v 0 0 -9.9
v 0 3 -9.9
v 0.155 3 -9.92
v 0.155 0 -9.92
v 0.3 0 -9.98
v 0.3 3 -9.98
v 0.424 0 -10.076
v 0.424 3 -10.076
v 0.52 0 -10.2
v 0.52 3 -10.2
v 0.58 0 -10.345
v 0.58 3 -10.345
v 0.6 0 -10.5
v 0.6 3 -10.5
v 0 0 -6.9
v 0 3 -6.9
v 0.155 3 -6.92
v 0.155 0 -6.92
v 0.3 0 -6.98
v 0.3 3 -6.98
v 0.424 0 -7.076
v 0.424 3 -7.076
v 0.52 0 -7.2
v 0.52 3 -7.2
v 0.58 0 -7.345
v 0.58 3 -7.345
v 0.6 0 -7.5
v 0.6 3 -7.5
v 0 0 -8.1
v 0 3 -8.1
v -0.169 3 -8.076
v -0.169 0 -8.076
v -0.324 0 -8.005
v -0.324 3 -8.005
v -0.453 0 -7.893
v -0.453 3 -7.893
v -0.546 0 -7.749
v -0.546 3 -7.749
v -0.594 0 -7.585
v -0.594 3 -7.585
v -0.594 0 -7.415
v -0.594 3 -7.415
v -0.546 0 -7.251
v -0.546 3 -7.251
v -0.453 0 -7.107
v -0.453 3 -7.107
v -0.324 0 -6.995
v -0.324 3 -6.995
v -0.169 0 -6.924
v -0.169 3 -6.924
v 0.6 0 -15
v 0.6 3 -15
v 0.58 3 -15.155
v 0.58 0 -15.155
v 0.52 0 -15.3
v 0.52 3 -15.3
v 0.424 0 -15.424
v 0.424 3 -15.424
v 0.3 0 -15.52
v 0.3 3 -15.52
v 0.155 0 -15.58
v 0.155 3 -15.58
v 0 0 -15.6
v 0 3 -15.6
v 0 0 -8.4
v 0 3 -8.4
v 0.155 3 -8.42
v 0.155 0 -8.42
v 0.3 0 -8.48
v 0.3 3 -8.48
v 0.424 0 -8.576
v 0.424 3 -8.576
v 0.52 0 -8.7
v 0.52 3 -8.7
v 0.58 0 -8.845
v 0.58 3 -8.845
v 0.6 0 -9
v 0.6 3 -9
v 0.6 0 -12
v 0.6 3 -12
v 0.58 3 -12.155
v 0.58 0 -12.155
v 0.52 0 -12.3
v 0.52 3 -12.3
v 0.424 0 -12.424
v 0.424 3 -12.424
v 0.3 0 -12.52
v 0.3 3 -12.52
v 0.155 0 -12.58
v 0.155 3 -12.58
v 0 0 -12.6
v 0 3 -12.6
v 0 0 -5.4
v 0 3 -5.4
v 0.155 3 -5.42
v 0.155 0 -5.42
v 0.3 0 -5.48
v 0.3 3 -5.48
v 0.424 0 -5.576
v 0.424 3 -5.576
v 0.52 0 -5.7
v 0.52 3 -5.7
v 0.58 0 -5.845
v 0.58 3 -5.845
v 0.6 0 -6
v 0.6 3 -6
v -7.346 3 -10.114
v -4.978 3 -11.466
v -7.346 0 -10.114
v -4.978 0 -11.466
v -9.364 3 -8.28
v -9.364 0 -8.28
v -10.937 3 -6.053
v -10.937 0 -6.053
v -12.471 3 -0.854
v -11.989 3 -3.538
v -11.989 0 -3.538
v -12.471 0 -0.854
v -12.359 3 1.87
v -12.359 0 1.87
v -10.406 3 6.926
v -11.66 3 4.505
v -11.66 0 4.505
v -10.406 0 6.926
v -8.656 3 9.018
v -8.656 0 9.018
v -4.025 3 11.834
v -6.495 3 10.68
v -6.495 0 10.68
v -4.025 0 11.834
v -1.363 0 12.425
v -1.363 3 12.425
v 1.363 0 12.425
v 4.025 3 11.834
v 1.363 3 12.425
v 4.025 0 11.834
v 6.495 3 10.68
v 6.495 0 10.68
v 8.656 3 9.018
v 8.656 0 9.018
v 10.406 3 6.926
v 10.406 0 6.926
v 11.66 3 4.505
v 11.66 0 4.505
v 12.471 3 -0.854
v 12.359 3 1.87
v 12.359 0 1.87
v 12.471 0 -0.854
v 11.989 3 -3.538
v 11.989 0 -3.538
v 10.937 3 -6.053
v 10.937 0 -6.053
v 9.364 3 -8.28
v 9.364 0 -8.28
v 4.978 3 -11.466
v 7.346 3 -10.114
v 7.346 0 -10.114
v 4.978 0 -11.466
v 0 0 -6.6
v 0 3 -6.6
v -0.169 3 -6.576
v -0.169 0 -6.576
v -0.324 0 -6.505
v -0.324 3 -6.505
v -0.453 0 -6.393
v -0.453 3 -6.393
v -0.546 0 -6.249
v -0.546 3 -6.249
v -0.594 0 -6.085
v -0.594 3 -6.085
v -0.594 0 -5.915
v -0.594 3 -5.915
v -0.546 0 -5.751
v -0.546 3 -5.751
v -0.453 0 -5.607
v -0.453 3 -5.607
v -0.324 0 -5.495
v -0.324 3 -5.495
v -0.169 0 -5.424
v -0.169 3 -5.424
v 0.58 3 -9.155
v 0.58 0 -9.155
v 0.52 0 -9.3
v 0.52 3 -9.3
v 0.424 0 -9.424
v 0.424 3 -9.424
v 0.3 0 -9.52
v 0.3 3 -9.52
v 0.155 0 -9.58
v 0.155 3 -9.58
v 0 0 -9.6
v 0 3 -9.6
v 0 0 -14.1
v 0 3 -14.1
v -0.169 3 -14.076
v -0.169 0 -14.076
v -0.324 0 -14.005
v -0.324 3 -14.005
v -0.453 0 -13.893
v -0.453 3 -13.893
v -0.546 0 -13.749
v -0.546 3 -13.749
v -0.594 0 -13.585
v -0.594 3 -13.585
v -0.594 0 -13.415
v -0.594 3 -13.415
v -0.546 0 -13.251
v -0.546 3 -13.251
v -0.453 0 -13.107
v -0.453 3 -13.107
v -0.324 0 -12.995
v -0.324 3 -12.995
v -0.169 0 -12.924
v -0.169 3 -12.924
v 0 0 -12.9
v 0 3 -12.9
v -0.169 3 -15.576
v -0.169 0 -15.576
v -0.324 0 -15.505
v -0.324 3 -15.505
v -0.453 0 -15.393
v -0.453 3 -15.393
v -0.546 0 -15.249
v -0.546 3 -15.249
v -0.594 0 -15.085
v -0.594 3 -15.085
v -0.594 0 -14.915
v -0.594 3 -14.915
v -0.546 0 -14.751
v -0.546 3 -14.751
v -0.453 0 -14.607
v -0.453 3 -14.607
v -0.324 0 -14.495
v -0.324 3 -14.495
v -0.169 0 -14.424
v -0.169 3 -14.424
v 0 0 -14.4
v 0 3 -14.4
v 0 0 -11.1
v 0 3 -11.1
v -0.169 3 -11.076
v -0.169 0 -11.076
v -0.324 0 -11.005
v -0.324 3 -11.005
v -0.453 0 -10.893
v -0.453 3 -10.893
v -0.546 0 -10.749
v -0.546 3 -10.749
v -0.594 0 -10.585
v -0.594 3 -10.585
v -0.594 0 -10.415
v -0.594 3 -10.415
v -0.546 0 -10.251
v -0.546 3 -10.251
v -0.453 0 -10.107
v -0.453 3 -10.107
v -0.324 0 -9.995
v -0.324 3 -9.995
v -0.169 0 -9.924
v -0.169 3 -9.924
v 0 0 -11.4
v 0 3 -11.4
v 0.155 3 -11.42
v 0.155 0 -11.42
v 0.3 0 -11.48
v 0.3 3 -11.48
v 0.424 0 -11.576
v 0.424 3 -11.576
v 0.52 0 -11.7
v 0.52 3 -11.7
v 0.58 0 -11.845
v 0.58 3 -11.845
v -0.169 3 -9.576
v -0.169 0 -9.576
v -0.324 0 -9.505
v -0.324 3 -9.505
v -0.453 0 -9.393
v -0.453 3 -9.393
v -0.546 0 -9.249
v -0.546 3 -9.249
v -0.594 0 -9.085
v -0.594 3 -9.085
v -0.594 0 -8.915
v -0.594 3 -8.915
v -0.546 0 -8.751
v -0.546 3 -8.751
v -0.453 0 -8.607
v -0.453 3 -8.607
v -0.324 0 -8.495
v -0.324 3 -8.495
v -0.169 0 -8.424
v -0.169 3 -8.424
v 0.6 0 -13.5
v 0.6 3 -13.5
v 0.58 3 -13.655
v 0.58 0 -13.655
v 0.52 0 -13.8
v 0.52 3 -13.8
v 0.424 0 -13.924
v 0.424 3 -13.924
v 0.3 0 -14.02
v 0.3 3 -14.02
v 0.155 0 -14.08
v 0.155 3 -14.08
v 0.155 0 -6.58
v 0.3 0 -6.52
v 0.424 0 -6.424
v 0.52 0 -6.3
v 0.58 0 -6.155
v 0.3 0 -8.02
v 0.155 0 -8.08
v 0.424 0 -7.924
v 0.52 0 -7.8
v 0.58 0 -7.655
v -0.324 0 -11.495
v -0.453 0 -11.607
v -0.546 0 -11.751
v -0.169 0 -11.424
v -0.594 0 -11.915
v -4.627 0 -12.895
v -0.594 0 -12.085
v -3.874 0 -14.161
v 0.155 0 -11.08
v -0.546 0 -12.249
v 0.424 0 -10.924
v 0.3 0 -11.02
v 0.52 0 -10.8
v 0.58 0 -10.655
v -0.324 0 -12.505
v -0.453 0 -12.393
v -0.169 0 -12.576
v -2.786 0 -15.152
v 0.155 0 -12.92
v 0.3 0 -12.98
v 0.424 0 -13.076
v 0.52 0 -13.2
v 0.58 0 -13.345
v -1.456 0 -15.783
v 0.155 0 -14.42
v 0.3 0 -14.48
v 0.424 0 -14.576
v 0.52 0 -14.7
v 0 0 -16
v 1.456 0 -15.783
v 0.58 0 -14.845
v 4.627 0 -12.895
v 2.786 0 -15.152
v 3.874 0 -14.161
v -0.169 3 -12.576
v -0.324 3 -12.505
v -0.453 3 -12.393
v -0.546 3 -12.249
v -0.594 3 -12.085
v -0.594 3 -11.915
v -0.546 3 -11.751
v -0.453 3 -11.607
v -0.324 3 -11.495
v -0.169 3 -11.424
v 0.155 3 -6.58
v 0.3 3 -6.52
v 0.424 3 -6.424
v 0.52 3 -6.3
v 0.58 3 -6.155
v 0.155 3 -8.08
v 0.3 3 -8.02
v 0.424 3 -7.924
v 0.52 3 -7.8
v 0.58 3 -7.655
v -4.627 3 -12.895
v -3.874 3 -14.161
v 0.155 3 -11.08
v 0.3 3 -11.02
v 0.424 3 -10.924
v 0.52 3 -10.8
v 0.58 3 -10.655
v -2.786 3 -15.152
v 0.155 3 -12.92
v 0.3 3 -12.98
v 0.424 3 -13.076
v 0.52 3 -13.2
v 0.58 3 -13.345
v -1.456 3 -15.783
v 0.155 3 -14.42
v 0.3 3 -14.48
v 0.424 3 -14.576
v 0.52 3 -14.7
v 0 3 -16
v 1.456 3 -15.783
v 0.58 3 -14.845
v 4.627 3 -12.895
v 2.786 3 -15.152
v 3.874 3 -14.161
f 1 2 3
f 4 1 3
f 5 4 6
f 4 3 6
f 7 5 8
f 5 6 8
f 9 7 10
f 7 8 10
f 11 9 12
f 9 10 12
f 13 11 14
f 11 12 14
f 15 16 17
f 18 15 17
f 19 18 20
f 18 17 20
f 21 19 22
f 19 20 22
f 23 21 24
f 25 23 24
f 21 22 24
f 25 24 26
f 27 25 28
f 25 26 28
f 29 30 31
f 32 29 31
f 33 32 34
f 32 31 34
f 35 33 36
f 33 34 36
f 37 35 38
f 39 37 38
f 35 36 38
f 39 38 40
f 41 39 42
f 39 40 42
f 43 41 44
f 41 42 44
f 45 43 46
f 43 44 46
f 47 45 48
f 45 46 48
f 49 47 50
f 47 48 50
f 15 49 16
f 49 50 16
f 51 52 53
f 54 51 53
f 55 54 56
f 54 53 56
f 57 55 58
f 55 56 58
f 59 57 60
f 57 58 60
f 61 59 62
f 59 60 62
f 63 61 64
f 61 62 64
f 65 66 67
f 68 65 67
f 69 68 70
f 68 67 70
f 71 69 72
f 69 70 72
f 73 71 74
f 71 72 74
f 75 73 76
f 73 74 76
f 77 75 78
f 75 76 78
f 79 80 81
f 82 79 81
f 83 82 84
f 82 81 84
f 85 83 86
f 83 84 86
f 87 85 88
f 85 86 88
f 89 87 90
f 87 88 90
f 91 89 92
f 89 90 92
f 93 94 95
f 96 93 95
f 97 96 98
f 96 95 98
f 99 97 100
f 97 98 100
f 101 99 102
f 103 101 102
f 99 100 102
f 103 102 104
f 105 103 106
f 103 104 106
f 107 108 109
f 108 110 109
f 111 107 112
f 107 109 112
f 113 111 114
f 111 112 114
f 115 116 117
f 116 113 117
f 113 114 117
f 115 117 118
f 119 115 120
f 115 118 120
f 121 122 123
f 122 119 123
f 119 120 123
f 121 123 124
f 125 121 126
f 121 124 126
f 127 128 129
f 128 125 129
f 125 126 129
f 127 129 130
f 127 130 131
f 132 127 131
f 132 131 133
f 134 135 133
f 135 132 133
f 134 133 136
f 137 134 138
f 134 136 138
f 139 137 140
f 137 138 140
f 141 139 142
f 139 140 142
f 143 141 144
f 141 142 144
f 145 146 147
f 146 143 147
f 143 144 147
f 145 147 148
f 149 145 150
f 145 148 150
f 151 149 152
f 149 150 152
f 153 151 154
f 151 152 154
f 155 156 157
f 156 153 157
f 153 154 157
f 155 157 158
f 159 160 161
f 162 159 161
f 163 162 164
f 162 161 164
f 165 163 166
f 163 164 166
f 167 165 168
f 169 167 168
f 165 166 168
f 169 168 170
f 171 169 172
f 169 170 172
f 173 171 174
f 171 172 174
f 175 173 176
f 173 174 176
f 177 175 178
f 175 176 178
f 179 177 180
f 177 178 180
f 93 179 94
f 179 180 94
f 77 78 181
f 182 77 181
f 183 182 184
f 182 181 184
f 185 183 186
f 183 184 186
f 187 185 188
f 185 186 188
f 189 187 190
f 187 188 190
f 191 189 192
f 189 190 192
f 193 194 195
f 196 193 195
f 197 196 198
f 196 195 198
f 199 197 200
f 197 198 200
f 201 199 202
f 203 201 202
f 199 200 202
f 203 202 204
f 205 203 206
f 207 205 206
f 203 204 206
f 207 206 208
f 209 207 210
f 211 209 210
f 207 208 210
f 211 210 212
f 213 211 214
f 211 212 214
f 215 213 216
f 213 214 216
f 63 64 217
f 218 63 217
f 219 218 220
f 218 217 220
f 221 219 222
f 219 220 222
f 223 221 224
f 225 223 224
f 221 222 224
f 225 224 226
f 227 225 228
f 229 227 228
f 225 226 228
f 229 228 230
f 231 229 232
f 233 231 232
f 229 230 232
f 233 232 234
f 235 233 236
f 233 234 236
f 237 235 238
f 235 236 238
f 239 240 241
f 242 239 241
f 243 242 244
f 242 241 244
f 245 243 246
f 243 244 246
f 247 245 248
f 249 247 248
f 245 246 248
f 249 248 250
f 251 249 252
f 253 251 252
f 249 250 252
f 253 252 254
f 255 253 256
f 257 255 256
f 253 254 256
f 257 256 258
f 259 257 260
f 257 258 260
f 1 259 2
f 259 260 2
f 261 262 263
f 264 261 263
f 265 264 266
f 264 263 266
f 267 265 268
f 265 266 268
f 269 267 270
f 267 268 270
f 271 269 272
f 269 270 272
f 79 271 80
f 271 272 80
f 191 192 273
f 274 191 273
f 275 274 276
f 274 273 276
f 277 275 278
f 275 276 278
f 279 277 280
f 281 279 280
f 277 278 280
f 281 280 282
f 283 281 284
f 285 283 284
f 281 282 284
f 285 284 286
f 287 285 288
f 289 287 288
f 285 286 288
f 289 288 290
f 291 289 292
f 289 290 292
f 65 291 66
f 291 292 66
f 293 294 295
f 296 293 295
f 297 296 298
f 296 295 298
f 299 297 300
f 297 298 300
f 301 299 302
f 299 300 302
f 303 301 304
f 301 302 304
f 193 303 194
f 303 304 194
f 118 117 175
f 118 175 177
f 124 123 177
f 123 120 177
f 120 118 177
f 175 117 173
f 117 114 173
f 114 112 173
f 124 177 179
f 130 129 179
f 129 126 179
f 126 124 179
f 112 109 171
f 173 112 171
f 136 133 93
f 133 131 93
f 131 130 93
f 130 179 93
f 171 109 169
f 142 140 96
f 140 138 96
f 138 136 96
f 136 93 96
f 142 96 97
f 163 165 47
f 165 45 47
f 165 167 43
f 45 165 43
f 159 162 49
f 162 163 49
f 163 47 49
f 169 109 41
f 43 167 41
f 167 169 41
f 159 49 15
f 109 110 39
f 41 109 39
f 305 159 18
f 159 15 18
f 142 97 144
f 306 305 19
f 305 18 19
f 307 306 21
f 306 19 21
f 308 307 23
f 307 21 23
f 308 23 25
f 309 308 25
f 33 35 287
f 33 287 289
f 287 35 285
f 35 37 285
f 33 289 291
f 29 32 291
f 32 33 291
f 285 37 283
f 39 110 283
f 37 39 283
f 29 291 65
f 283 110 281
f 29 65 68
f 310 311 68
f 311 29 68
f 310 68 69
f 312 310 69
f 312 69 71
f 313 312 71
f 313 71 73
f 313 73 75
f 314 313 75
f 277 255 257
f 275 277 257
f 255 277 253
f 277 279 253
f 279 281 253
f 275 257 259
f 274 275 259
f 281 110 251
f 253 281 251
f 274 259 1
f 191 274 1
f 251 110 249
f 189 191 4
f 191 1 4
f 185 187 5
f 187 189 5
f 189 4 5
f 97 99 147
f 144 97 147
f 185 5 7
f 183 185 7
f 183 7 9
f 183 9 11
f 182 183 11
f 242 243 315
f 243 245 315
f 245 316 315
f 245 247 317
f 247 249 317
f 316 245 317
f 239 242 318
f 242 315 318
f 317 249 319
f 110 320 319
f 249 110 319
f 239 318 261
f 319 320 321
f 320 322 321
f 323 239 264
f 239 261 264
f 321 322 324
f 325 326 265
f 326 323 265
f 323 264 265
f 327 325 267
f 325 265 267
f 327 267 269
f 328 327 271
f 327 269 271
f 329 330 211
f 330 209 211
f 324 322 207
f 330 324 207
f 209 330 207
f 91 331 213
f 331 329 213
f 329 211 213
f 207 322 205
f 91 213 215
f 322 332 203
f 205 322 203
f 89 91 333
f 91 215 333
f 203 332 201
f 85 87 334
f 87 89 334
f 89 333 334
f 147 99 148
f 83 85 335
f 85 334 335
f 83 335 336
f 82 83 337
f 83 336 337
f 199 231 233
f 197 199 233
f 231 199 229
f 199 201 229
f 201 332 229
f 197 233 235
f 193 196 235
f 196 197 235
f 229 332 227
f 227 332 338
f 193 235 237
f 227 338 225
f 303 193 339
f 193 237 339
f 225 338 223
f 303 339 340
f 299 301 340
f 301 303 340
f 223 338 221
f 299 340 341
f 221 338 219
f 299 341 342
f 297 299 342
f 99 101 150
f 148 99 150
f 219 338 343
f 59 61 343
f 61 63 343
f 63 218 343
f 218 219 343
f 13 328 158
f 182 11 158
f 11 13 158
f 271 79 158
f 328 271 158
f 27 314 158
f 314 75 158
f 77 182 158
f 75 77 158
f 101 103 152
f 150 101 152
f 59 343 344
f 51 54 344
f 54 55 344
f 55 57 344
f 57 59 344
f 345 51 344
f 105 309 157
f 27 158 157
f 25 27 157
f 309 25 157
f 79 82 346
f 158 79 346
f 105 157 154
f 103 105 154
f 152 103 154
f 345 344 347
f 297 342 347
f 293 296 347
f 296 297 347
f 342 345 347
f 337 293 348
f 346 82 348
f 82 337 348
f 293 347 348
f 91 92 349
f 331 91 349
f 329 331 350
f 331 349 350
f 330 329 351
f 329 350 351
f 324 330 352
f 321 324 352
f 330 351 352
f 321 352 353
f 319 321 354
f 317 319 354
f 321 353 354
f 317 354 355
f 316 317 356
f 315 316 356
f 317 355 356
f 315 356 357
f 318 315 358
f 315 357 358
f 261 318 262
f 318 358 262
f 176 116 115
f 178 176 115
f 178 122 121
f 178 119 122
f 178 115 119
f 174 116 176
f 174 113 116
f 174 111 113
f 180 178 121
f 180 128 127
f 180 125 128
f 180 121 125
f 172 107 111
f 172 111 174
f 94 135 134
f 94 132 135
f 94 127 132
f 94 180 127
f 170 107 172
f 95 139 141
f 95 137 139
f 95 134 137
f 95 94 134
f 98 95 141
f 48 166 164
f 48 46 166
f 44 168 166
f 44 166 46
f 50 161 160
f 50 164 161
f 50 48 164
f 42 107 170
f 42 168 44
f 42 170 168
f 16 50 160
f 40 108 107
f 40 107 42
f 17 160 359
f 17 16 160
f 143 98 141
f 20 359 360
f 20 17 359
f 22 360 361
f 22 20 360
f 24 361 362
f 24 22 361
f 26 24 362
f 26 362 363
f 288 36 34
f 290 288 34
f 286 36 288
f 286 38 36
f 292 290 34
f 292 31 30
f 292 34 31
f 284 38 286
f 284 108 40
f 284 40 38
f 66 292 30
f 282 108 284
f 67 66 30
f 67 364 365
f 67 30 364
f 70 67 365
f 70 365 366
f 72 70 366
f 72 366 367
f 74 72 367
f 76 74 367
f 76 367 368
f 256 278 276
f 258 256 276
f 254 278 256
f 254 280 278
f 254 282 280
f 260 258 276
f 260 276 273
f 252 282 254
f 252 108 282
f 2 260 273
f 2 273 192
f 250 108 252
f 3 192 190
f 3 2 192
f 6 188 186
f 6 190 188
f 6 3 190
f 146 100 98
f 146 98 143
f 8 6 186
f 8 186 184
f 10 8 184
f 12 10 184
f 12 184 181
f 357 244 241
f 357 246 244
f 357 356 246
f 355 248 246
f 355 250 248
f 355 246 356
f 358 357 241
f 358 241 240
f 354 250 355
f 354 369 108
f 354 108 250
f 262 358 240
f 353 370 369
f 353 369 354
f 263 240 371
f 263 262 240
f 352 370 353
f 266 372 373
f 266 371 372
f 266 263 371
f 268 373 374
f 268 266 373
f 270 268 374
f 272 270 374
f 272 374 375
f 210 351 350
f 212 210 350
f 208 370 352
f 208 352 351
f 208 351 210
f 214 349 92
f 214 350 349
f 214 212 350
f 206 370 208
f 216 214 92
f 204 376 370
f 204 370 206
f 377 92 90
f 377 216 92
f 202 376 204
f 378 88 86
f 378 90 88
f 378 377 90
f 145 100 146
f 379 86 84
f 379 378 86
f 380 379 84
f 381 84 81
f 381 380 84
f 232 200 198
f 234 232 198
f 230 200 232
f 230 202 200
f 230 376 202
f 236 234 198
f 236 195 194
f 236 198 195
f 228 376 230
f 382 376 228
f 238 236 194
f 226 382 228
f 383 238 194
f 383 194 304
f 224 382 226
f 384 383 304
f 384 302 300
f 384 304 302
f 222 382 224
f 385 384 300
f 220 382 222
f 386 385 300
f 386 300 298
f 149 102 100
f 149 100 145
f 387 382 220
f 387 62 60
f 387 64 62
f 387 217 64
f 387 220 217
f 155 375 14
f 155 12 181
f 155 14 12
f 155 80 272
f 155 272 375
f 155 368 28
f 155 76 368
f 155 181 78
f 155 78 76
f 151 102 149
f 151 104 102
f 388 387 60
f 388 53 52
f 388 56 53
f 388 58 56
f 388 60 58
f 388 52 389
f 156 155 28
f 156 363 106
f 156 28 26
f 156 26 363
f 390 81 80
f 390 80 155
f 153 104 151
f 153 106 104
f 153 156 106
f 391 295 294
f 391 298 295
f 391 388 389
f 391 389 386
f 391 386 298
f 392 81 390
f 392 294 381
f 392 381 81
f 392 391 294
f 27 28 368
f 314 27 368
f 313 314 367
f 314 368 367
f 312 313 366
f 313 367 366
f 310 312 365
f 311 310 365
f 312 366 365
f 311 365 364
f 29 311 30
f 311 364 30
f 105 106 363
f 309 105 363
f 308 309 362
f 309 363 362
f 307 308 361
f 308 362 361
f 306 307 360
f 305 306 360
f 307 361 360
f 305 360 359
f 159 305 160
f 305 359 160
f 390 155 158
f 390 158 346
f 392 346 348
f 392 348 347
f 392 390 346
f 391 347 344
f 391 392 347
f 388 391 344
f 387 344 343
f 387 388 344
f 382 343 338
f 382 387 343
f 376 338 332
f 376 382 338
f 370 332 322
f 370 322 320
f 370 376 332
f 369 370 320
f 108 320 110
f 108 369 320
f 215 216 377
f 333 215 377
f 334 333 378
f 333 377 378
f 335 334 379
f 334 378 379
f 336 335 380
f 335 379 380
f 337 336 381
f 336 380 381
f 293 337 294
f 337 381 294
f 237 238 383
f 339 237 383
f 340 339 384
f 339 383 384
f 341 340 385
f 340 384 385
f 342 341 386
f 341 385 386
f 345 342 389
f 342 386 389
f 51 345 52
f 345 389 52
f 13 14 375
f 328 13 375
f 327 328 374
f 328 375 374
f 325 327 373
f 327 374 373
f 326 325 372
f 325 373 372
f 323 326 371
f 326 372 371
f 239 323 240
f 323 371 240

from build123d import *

# Parameters (mm, degrees)
SKETCH1_R           = 12.5
BOSS_EXTRUDE1_DEPTH = 3
SKETCH3_R           = 5
BOSS_EXTRUDE2_DEPTH = 3
CUT_EXTRUDE1_DEPTH  = 10


with BuildPart() as part:
    # Sketch1 → Boss-Extrude1 (new body)
    with BuildSketch(Plane(origin=(0, 0, 0), x_dir=(1, 0, 0), z_dir=(0, 1, 0))):
        Circle(SKETCH1_R)
    extrude(amount=BOSS_EXTRUDE1_DEPTH)

    # Sketch3 → Boss-Extrude2 (add)
    with BuildSketch(Plane(origin=(0, 3, 0), x_dir=(1, 0, 0), z_dir=(0, 1, 0))):
        with Locations((0, 11)):
            Circle(SKETCH3_R)
    extrude(amount=-BOSS_EXTRUDE2_DEPTH)

    # Sketch4 → Cut-Extrude1 (cut)
    with BuildSketch(Plane(origin=(0, 3, 0), x_dir=(1, 0, 0), z_dir=(0, 1, 0))):
        with BuildLine():
            ThreePointArc((0.6, 6), (0.424264069, 6.424264069), (0, 6.6))
            Line((0, 6.6), (0, 5.4))
            ThreePointArc((0, 5.4), (0.424264069, 5.575735931), (0.6, 6))
        make_face()
        with BuildLine():
            Line((0, 5.4), (0, 6.6))
            ThreePointArc((0, 6.6), (-0.6, 6), (0, 5.4))
        make_face()
        with BuildLine():
            ThreePointArc((0.6, 7.5), (0.424264069, 7.924264069), (0, 8.1))
            Line((0, 8.1), (0, 6.9))
            ThreePointArc((0, 6.9), (0.424264069, 7.075735931), (0.6, 7.5))
        make_face()
        with BuildLine():
            Line((0, 6.9), (0, 8.1))
            ThreePointArc((0, 8.1), (-0.6, 7.5), (0, 6.9))
        make_face()
        with BuildLine():
            ThreePointArc((0.6, 9), (0.424264069, 9.424264069), (0, 9.6))
            Line((0, 9.6), (0, 8.4))
            ThreePointArc((0, 8.4), (0.424264069, 8.575735931), (0.6, 9))
        make_face()
        with BuildLine():
            Line((0, 8.4), (0, 9.6))
            ThreePointArc((0, 9.6), (-0.6, 9), (0, 8.4))
        make_face()
        with BuildLine():
            ThreePointArc((0.6, 10.5), (0.424264069, 10.924264069), (0, 11.1))
            Line((0, 11.1), (0, 9.9))
            ThreePointArc((0, 9.9), (0.424264069, 10.075735931), (0.6, 10.5))
        make_face()
        with BuildLine():
            Line((0, 9.9), (0, 11.1))
            ThreePointArc((0, 11.1), (-0.6, 10.5), (0, 9.9))
        make_face()
        with BuildLine():
            ThreePointArc((0.6, 12), (0.424264069, 12.424264069), (0, 12.6))
            Line((0, 12.6), (0, 11.4))
            ThreePointArc((0, 11.4), (0.424264069, 11.575735931), (0.6, 12))
        make_face()
        with BuildLine():
            Line((0, 11.4), (0, 12.6))
            ThreePointArc((0, 12.6), (-0.6, 12), (0, 11.4))
        make_face()
        with BuildLine():
            ThreePointArc((0.6, 13.5), (0.424264069, 13.924264069), (0, 14.1))
            Line((0, 14.1), (0, 12.9))
            ThreePointArc((0, 12.9), (0.424264069, 13.075735931), (0.6, 13.5))
        make_face()
        with BuildLine():
            Line((0, 12.9), (0, 14.1))
            ThreePointArc((0, 14.1), (-0.6, 13.5), (0, 12.9))
        make_face()
        with BuildLine():
            ThreePointArc((0.6, 15), (0.424264069, 15.424264069), (0, 15.6))
            Line((0, 15.6), (0, 14.4))
            ThreePointArc((0, 14.4), (0.424264069, 14.575735931), (0.6, 15))
        make_face()
        with BuildLine():
            Line((0, 14.4), (0, 15.6))
            ThreePointArc((0, 15.6), (-0.6, 15), (0, 14.4))
        make_face()
    extrude(amount=-CUT_EXTRUDE1_DEPTH, mode=Mode.SUBTRACT)


solid = part.part
